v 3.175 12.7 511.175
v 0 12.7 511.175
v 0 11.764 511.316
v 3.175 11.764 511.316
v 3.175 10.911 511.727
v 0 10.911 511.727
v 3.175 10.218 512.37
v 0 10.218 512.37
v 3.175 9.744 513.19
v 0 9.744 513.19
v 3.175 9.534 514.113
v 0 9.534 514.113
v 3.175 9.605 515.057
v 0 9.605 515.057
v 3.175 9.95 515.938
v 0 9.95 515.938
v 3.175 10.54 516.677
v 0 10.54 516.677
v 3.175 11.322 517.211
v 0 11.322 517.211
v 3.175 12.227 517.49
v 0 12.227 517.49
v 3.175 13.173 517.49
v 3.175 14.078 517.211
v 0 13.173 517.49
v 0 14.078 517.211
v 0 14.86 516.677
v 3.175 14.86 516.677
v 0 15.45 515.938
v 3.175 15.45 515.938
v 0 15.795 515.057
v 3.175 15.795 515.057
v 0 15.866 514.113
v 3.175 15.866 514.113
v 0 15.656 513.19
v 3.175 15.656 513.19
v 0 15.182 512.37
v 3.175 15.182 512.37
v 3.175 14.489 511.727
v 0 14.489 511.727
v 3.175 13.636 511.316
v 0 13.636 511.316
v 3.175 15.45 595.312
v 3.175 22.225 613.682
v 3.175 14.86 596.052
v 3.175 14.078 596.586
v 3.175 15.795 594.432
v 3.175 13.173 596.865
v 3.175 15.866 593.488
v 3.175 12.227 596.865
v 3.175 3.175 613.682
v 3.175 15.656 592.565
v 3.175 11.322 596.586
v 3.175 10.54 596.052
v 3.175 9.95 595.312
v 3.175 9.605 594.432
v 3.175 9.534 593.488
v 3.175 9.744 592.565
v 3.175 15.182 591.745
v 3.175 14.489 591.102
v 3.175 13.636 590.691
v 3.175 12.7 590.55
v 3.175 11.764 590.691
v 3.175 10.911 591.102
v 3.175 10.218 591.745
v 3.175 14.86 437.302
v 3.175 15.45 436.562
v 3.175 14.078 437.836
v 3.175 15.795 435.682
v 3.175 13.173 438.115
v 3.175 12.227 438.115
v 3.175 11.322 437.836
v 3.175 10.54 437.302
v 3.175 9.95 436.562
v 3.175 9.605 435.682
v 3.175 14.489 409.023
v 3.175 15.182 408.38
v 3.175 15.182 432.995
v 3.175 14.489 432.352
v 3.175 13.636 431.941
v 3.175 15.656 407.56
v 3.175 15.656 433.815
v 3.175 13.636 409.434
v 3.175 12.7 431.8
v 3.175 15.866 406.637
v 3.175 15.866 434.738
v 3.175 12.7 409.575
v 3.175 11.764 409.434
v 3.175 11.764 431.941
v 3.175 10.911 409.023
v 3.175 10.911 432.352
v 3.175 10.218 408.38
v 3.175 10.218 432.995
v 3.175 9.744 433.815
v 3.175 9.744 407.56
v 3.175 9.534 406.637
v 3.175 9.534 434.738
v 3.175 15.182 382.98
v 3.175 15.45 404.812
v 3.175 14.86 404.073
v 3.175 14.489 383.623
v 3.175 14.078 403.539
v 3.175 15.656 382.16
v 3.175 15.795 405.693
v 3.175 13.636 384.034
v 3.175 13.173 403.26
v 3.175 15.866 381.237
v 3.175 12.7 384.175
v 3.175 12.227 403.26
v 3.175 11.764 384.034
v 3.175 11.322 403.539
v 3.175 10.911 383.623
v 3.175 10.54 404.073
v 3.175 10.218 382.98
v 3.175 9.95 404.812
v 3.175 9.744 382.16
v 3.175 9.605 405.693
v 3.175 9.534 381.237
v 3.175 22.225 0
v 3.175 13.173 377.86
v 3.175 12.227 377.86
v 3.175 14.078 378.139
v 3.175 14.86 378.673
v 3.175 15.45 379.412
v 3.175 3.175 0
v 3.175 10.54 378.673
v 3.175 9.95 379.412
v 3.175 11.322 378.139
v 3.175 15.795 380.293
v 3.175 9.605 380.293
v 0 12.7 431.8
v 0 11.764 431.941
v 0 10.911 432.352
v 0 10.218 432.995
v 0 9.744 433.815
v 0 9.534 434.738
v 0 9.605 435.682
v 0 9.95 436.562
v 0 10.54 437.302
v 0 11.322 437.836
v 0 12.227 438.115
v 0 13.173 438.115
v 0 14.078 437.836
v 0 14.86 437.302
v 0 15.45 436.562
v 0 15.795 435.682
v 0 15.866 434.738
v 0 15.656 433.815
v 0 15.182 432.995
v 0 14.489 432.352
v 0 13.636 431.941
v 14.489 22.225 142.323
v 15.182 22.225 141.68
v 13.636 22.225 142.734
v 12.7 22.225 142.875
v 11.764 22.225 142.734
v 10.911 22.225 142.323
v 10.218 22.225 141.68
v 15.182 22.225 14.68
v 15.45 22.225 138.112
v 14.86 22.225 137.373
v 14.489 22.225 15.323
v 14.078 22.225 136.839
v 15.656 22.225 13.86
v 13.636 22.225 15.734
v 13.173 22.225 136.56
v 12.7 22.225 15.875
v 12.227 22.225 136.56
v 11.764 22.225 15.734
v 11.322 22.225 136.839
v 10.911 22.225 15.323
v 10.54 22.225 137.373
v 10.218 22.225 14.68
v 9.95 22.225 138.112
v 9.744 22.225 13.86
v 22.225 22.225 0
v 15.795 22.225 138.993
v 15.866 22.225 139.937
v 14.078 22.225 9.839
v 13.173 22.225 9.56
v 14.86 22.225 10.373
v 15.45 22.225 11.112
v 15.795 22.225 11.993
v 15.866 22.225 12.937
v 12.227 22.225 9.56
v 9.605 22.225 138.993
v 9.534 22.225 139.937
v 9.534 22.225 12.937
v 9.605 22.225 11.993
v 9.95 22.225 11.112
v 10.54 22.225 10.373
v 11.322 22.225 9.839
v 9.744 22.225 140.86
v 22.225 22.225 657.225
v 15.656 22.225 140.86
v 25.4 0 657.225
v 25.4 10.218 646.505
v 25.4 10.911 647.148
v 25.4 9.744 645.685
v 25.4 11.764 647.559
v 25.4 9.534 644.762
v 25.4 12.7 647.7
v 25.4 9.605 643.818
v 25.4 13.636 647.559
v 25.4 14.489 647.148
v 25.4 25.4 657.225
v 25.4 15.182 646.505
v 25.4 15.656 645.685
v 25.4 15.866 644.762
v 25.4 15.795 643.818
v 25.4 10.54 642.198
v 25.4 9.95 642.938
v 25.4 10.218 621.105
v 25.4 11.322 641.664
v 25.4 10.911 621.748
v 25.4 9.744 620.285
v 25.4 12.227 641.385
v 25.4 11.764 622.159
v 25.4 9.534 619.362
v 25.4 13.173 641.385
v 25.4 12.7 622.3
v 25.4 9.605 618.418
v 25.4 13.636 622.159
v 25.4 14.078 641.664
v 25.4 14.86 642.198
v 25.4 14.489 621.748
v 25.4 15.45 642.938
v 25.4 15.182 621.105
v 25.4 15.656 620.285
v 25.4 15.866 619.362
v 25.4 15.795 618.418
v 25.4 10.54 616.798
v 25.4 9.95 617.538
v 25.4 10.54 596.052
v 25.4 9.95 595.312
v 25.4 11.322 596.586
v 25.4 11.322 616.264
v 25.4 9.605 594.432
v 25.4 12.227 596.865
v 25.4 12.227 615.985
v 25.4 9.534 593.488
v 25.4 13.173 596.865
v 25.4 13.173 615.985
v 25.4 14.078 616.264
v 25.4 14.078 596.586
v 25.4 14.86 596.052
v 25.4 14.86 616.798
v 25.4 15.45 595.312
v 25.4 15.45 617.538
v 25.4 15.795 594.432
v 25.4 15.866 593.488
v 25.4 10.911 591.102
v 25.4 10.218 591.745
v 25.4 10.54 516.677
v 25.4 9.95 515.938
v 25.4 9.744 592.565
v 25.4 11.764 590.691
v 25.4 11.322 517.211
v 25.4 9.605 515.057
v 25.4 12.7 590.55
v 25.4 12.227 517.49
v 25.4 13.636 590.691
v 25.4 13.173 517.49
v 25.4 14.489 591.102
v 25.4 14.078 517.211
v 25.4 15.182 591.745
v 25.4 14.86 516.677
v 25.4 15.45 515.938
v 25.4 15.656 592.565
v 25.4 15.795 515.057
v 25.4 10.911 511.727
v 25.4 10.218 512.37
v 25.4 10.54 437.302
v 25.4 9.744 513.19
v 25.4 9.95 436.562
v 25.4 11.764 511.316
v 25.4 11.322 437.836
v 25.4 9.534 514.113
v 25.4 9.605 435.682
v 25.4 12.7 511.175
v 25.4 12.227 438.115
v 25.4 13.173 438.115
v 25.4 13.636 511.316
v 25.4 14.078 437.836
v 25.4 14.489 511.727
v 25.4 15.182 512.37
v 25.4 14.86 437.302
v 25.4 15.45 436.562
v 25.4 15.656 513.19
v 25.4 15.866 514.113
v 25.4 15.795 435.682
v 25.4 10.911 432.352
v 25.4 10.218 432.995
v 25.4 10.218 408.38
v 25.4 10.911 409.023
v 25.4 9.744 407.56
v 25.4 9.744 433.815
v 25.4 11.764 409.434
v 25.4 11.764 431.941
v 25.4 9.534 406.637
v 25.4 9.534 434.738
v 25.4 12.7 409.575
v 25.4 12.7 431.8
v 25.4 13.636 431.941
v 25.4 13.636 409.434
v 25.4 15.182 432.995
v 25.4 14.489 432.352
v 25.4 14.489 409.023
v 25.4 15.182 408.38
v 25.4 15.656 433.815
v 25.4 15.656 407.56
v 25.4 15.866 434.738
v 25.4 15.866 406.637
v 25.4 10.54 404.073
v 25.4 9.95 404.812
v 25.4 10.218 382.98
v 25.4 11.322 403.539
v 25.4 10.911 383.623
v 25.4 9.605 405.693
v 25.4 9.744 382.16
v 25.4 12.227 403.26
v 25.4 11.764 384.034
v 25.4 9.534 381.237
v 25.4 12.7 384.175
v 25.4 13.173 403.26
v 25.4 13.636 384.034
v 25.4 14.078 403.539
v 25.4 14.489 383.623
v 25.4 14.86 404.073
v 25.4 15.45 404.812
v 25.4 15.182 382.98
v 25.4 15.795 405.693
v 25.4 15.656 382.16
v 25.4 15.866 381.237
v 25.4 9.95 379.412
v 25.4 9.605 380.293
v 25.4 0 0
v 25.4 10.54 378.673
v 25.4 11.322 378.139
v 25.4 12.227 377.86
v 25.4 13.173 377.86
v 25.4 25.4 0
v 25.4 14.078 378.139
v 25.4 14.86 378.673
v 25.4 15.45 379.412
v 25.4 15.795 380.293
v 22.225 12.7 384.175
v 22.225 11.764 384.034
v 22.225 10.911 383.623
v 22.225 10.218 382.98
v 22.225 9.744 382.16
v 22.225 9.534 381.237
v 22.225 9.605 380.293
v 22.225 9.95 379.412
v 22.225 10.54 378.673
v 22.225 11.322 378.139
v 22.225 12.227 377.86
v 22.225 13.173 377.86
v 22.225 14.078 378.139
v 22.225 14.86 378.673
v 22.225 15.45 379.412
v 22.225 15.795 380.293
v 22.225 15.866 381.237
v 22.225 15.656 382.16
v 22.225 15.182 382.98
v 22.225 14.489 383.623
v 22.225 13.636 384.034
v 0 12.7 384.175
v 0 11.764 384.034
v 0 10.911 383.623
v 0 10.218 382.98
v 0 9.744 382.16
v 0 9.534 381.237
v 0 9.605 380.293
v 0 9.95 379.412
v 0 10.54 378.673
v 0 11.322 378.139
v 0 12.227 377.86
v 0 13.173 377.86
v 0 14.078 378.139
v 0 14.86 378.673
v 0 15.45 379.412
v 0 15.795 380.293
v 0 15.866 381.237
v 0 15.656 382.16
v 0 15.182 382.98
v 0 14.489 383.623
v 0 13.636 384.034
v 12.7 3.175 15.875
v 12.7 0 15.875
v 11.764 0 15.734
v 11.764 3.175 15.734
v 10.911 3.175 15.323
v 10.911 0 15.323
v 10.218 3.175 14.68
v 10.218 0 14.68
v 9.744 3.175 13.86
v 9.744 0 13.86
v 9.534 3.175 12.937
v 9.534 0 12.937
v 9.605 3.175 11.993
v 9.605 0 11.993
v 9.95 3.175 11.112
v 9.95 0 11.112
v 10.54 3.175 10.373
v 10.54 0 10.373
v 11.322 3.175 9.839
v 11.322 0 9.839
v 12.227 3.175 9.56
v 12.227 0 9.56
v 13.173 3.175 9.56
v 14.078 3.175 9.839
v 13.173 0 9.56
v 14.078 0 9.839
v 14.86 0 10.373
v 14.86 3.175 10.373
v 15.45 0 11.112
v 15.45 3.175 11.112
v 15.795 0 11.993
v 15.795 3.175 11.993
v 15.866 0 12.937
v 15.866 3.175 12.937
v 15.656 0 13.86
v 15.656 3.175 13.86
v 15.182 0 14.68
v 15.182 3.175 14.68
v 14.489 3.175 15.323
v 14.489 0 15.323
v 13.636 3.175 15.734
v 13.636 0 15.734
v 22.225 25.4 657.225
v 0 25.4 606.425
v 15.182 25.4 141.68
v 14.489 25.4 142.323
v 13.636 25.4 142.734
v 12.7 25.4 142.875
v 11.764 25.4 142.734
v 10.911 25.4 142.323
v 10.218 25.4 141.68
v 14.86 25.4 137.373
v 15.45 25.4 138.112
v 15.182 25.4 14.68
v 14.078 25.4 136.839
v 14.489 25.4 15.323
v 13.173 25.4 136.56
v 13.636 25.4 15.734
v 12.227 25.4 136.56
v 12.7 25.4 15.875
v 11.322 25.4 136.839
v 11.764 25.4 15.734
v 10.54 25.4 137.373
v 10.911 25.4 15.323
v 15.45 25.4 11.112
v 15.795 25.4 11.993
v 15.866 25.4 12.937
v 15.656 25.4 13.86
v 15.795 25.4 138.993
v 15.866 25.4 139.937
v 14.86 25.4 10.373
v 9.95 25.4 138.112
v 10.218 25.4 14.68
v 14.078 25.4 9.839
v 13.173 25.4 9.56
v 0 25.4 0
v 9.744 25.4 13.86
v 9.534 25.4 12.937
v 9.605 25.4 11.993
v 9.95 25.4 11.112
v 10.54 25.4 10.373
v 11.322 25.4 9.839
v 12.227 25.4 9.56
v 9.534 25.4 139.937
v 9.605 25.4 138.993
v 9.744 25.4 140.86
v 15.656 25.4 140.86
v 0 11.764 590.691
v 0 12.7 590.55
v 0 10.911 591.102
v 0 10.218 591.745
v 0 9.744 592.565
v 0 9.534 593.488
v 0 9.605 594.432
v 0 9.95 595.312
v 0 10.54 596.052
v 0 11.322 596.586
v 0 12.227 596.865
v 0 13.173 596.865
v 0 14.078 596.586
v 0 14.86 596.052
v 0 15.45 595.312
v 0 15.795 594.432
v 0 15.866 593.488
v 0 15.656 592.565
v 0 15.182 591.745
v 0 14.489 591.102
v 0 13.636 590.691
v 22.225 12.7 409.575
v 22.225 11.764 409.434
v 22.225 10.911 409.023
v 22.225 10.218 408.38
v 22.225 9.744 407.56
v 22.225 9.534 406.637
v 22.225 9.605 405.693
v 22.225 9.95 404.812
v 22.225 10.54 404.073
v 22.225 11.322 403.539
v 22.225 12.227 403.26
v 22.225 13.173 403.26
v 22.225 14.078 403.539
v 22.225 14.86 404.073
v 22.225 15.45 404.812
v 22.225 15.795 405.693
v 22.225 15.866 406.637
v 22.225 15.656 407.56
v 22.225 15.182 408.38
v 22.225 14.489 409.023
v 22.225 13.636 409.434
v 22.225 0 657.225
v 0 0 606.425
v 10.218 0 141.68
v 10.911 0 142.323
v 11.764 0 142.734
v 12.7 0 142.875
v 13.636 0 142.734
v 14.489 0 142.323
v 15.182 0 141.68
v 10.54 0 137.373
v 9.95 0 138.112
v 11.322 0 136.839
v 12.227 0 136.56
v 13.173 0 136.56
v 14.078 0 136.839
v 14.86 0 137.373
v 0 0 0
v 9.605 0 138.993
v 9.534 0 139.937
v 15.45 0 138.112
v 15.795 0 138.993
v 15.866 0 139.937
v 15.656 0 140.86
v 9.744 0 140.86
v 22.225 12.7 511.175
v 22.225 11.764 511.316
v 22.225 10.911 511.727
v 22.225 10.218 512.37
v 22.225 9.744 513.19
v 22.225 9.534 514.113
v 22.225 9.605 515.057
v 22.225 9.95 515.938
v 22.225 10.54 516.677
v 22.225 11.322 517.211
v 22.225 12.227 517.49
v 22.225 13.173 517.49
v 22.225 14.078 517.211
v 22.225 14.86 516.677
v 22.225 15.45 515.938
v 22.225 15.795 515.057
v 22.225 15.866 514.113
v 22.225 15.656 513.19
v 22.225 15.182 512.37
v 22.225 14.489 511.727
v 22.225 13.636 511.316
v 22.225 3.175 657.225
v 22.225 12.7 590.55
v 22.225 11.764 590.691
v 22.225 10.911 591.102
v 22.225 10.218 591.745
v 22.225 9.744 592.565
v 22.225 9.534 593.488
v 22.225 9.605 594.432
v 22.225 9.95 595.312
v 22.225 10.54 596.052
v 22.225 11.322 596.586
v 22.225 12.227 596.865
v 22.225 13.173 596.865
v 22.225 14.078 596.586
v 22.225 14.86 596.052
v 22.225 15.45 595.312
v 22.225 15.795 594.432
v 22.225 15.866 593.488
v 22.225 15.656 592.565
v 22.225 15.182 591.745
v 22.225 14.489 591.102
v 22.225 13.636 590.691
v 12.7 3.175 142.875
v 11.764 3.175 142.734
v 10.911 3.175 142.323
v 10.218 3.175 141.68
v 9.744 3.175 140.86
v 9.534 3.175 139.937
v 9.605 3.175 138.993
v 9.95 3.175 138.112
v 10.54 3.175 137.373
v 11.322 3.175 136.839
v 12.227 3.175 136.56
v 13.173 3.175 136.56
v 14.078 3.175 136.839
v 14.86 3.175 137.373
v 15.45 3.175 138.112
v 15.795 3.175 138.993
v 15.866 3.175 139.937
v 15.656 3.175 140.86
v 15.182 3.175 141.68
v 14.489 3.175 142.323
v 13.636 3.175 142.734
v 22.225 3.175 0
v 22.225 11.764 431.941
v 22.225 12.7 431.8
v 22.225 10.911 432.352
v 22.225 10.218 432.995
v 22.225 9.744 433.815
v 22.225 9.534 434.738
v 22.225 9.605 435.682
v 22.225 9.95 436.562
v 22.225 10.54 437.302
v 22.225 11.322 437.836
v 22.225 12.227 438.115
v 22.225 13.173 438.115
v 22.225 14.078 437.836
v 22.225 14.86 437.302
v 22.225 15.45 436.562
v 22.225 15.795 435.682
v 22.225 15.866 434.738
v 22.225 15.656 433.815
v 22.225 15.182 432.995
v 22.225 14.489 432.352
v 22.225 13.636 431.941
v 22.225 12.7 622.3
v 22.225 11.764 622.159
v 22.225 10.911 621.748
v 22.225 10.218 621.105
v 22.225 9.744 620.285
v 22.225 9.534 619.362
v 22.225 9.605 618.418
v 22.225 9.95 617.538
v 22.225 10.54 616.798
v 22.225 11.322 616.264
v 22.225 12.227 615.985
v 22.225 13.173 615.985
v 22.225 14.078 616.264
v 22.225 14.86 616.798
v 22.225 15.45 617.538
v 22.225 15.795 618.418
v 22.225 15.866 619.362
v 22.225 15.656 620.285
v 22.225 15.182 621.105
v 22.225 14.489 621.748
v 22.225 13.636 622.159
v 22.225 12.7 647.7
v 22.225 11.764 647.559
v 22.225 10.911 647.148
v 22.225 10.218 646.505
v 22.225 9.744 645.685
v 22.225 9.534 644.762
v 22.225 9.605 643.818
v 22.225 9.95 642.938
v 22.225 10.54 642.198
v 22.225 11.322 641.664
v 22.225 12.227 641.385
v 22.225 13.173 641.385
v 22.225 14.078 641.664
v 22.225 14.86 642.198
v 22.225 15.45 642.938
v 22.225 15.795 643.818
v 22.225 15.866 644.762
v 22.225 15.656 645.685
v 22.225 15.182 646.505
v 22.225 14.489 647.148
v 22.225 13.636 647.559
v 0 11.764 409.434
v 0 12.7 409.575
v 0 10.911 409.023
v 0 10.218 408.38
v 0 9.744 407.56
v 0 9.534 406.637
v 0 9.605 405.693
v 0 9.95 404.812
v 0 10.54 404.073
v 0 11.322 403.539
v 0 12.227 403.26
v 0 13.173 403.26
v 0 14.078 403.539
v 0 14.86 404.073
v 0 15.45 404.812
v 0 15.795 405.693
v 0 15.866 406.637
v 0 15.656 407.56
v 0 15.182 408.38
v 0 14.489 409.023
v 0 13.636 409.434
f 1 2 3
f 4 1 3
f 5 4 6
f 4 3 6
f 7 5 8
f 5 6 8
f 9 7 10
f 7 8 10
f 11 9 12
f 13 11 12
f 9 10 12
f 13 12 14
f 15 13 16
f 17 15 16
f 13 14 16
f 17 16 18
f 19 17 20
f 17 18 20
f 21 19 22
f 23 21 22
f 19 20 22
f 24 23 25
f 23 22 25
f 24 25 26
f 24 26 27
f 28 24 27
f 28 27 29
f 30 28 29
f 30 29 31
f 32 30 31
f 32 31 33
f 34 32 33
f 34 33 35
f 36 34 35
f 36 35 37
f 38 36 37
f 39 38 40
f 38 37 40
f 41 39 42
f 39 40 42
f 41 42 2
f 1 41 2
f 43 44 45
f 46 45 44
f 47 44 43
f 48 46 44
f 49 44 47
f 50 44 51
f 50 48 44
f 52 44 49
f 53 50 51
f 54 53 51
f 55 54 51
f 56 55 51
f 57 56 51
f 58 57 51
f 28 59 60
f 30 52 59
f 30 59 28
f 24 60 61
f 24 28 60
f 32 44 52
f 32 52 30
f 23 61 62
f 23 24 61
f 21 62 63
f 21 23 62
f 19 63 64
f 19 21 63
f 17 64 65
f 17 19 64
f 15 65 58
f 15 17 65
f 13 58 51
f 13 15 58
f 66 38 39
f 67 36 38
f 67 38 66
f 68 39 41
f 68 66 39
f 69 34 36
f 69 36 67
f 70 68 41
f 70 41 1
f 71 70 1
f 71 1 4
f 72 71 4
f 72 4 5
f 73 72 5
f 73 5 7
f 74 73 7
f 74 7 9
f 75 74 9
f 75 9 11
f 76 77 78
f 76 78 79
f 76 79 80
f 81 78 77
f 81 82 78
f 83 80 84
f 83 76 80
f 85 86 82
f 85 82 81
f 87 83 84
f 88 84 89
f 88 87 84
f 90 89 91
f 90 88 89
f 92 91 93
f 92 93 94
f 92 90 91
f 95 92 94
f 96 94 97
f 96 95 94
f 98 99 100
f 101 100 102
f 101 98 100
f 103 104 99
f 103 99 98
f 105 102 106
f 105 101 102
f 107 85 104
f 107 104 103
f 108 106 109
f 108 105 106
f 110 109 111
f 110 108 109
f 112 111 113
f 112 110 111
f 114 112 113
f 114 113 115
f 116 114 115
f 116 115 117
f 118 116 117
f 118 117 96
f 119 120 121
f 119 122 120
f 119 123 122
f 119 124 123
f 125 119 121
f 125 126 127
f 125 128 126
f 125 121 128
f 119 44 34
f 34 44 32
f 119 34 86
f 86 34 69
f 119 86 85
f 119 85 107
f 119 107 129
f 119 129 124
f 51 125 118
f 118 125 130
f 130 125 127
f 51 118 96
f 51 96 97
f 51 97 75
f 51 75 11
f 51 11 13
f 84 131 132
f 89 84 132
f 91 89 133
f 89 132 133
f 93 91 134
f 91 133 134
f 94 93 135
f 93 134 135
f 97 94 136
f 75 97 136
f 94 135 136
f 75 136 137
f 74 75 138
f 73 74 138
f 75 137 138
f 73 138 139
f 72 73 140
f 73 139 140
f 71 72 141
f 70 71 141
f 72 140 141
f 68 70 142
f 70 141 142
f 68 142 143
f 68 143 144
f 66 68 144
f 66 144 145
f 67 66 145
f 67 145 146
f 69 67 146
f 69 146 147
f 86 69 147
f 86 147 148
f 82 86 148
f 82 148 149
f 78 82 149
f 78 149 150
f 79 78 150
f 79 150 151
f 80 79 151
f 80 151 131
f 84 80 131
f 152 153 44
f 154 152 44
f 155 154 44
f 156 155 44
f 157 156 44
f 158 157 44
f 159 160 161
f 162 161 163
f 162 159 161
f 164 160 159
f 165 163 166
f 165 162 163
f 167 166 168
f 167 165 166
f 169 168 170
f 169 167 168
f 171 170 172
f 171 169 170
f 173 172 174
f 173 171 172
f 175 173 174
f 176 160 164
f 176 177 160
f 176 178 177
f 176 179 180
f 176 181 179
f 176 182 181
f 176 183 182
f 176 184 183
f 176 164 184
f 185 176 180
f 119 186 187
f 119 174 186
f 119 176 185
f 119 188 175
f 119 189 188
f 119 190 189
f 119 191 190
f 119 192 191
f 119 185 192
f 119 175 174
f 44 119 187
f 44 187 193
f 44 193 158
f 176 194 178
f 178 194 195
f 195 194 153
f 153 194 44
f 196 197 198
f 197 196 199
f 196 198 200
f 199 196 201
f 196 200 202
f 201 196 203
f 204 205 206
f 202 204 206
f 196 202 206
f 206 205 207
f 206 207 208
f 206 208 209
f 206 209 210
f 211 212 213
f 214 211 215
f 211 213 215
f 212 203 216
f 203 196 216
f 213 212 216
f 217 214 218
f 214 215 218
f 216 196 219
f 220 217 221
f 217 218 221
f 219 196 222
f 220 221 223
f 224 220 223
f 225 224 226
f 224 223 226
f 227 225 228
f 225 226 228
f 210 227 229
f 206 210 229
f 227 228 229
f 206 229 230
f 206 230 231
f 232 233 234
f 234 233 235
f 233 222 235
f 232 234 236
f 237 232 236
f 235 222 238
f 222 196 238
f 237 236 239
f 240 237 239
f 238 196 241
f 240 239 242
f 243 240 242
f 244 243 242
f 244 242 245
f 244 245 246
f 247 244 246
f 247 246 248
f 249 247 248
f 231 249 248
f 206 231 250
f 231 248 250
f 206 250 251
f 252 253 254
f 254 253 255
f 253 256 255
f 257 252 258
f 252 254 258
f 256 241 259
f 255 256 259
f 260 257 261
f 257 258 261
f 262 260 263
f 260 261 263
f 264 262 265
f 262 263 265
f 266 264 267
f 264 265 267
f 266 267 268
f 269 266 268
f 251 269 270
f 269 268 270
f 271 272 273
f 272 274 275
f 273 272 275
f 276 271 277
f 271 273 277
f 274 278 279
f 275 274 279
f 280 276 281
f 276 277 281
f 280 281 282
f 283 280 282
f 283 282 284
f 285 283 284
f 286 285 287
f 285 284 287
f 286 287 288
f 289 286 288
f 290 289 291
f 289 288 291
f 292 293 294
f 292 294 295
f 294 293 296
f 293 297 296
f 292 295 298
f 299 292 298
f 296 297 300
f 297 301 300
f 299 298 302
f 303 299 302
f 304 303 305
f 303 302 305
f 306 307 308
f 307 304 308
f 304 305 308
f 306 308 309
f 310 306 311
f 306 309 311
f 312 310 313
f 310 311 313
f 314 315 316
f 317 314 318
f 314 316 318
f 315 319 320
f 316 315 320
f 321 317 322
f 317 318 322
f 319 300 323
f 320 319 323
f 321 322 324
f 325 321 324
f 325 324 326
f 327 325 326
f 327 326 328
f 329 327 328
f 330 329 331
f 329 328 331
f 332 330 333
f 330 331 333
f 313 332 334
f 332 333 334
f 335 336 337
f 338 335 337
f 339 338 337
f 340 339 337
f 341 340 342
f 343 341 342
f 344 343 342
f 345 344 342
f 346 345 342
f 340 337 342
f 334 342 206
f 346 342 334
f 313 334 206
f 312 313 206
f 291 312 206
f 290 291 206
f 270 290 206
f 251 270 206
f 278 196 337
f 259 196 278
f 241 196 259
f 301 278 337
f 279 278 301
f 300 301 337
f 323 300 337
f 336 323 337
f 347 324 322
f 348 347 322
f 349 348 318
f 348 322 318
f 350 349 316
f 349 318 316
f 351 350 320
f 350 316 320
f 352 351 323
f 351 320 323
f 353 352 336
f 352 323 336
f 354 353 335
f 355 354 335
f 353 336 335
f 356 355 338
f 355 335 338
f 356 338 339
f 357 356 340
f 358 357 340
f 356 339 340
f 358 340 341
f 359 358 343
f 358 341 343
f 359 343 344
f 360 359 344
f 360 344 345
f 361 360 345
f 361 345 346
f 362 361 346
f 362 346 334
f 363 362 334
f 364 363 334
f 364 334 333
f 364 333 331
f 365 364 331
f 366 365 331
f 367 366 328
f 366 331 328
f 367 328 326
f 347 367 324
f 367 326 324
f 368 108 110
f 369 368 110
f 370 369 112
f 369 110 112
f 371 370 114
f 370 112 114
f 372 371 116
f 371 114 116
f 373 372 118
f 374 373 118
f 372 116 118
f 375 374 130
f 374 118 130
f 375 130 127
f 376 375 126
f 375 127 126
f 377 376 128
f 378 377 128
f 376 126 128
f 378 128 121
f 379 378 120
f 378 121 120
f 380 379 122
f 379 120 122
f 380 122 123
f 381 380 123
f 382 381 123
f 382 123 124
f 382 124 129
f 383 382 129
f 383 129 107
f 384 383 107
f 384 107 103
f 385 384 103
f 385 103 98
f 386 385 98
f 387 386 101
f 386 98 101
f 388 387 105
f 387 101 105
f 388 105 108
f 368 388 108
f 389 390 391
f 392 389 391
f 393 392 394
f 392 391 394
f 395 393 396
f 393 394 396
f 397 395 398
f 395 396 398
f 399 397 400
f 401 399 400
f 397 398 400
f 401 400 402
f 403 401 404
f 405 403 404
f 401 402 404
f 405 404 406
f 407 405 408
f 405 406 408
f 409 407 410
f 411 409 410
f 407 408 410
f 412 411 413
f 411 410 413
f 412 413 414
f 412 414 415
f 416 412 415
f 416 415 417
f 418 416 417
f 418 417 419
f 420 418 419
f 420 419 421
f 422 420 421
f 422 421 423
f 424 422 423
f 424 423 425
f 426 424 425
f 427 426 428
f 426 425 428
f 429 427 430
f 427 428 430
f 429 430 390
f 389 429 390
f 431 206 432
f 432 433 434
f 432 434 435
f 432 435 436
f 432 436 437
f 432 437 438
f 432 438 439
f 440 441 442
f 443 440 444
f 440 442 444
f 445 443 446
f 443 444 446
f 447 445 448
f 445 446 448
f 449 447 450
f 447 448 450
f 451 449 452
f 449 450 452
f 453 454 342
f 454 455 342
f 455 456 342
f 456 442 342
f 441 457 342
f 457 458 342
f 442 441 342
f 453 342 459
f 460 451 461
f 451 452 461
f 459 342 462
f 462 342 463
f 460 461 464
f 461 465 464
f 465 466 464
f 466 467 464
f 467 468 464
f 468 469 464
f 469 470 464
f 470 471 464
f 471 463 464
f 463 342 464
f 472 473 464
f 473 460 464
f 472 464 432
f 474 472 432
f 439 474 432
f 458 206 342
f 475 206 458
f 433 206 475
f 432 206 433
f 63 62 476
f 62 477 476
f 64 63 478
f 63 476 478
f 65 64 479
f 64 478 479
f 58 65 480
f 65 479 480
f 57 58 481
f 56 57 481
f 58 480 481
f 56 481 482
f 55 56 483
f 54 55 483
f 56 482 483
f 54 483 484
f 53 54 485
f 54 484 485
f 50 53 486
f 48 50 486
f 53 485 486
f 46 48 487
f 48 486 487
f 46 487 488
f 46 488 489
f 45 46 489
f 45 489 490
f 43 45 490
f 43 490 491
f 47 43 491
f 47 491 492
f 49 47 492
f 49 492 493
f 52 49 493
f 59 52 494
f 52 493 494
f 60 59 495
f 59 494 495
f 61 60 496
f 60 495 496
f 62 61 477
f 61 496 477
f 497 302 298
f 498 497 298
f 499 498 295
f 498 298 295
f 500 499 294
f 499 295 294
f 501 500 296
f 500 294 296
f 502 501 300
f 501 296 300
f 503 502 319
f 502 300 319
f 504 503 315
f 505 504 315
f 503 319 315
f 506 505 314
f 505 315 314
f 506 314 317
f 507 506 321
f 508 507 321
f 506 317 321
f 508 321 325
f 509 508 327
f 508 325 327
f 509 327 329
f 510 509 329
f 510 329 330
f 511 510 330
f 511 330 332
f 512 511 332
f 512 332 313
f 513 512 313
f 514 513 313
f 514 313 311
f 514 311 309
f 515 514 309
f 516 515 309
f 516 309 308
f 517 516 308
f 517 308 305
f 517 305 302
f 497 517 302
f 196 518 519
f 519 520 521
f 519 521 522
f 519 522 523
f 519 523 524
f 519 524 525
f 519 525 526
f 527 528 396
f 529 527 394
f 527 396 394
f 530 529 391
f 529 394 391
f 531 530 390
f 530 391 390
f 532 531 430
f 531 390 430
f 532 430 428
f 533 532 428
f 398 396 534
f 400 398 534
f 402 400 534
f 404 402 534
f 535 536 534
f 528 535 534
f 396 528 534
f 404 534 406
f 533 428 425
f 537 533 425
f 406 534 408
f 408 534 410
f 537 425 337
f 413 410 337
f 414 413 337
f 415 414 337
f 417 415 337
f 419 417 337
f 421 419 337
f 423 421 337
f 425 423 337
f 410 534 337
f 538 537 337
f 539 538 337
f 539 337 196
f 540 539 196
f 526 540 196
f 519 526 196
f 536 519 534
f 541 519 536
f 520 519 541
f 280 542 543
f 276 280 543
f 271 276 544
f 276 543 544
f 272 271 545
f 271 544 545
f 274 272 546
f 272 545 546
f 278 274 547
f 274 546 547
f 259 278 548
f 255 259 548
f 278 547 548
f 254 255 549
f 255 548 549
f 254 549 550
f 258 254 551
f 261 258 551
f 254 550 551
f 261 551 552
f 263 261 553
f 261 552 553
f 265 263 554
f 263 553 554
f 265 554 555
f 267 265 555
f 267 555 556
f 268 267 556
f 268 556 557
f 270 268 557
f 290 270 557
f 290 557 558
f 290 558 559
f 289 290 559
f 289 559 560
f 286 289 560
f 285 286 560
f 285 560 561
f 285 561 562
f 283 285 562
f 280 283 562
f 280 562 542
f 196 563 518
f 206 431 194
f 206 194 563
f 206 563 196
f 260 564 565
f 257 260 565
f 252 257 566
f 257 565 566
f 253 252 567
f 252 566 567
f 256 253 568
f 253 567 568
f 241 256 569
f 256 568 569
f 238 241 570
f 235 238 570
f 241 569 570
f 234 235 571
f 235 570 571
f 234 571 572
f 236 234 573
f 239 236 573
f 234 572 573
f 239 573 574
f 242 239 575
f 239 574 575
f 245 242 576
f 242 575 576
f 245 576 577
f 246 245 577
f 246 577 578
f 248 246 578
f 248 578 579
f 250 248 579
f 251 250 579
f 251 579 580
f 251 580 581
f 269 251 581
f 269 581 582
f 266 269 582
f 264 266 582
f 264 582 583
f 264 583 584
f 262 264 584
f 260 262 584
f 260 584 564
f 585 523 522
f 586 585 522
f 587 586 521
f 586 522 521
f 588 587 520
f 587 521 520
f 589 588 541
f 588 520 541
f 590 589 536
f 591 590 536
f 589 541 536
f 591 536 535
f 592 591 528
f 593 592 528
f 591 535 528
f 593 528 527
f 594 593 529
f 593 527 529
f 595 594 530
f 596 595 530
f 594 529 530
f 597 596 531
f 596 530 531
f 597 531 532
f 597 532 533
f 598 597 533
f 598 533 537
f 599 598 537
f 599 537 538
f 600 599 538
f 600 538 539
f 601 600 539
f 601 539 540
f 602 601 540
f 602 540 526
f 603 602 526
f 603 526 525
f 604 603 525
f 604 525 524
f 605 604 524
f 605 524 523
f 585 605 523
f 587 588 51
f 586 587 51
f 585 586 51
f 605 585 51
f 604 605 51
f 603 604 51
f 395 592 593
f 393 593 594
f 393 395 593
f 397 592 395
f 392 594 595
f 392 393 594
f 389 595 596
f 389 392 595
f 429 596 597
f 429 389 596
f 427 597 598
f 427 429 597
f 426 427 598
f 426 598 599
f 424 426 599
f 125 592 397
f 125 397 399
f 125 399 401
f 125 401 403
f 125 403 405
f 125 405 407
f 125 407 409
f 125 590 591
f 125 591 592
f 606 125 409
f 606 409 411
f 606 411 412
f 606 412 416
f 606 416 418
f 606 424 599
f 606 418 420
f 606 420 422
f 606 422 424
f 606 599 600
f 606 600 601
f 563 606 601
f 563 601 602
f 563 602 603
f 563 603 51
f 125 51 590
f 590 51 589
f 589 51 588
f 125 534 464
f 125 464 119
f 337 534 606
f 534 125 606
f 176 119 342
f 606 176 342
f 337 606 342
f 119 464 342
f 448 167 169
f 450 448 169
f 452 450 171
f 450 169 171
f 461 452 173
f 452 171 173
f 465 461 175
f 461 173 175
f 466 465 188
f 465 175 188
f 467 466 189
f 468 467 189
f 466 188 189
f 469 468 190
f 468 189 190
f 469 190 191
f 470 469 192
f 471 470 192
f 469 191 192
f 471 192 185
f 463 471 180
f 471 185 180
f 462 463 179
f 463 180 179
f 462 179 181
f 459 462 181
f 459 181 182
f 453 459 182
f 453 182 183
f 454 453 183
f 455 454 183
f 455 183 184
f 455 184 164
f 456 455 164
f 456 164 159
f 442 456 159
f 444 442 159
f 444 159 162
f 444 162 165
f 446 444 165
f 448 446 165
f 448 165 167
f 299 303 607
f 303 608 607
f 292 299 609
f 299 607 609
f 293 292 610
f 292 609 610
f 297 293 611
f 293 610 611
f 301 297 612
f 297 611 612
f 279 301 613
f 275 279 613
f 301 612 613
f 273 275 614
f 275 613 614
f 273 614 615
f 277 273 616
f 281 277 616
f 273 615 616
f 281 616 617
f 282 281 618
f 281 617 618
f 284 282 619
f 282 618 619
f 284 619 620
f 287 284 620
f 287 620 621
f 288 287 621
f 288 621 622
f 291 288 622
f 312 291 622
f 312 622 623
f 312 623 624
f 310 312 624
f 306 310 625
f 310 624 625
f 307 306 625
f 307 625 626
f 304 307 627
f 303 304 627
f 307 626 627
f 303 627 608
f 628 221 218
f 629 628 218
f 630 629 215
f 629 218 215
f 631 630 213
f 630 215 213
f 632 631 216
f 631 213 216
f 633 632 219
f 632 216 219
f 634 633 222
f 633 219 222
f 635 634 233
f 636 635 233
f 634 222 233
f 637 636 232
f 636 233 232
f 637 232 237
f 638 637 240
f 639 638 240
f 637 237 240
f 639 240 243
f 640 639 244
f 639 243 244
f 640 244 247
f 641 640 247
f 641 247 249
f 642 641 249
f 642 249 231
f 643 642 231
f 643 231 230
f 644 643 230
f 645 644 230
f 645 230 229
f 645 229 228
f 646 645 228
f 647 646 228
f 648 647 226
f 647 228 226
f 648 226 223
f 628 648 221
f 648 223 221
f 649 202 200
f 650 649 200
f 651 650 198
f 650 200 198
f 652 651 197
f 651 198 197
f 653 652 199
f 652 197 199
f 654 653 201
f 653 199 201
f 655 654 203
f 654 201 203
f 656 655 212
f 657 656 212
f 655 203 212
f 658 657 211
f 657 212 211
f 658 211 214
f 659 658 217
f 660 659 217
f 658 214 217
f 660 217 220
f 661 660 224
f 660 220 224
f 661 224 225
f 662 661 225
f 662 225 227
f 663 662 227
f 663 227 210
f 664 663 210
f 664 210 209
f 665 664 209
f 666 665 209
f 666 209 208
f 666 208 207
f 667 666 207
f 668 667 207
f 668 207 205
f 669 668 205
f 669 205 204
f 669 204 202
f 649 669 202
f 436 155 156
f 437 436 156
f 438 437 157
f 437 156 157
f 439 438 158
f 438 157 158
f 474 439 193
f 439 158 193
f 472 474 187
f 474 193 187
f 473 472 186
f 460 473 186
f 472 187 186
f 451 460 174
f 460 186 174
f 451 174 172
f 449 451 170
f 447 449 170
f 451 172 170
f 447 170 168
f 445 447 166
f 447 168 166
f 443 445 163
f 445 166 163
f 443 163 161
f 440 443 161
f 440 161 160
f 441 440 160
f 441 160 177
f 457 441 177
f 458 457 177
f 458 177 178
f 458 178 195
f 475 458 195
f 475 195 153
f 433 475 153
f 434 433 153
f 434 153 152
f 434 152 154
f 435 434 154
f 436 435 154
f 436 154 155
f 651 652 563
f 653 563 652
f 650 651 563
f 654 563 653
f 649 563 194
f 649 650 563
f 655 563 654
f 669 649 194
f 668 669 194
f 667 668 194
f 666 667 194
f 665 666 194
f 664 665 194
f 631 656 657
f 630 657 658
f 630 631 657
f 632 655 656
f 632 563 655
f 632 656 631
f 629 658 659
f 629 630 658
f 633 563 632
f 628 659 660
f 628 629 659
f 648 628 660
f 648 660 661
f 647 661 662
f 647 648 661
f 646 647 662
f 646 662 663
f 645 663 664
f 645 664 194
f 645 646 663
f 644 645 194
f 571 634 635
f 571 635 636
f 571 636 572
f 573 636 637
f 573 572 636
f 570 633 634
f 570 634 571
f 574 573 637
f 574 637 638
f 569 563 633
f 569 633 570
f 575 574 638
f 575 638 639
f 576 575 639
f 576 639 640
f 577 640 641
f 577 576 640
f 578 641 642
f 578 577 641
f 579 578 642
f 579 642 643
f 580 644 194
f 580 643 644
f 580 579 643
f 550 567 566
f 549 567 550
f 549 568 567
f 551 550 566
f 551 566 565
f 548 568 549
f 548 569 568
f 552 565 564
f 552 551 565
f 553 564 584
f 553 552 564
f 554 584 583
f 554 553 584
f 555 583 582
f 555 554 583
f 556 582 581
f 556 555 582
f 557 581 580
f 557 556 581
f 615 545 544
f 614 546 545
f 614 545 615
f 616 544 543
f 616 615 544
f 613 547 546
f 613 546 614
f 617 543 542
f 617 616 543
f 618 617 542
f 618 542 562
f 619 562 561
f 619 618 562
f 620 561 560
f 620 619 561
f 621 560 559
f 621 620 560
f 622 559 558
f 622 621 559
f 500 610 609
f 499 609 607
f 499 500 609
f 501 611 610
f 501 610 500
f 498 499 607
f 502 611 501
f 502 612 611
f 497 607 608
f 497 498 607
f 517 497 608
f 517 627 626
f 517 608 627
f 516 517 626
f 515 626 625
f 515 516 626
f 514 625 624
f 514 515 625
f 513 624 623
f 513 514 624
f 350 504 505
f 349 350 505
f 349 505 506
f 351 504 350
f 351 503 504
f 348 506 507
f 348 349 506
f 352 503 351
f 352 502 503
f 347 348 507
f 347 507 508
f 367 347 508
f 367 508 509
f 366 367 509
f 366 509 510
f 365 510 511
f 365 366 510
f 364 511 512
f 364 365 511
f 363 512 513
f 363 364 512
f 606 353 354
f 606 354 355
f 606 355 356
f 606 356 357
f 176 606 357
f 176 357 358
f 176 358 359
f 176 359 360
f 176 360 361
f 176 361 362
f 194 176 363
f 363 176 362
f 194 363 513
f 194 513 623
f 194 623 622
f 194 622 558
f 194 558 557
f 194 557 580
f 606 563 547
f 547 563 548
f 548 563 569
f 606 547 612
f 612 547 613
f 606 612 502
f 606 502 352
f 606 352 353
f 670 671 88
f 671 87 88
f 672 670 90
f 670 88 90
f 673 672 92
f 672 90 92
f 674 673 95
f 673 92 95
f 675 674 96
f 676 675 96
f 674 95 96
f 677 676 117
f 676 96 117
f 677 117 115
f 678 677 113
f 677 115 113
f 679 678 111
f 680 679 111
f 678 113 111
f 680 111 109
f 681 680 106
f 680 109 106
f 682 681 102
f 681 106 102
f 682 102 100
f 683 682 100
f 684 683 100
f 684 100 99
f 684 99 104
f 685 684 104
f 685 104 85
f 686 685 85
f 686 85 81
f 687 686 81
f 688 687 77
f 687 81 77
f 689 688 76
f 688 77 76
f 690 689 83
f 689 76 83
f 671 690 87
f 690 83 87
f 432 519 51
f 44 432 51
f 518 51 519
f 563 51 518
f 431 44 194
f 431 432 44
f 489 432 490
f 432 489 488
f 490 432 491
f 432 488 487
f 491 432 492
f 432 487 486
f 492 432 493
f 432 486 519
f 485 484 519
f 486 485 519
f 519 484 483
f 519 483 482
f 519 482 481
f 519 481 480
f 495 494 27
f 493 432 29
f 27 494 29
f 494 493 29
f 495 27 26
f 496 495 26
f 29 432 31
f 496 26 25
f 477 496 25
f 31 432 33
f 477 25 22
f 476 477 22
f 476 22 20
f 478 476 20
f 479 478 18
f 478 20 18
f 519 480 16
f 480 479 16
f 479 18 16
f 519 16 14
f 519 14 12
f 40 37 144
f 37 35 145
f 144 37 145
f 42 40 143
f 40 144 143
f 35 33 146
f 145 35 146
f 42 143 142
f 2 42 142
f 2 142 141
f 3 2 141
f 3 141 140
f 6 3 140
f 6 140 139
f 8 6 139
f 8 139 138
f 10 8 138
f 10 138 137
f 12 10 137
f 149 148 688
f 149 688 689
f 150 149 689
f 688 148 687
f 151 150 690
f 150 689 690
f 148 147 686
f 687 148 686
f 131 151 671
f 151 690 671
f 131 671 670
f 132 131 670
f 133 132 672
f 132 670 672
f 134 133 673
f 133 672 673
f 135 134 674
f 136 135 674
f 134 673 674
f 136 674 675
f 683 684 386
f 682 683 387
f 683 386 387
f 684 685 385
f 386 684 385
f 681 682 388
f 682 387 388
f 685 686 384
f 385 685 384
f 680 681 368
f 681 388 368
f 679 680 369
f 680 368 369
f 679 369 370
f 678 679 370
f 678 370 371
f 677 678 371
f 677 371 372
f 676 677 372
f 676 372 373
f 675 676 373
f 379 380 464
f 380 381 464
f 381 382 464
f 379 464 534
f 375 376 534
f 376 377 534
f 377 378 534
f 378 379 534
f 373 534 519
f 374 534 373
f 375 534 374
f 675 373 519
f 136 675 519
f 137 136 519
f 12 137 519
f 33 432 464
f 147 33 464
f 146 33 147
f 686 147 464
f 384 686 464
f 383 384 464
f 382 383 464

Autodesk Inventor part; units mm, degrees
ref_plane "YZ Plane" through (0, 0, 0) normal (1, 0, 0) x (0, 1, 0)
ref_plane "XZ Plane" through (0, 0, 0) normal (0, 1, 0) x (-1, 0, 0)
ref_plane "XY Plane" through (0, 0, 0) normal (0, 0, 1) x (1, 0, 0)
sketch "Sketch1" plane through (0, 0, 0) normal (0, 0, 1) x (1, 0, 0)
  line L0 (0, 0) -> (25.4, 0)
  line L1 (25.4, 0) -> (25.4, 25.4)
  line L2 (25.4, 25.4) -> (0, 25.4)
  line L3 (0, 25.4) -> (0, 0)
  line L4 (3.175, 3.175) -> (22.225, 3.175)
  line L5 (22.225, 3.175) -> (22.225, 22.225)
  line L6 (22.225, 22.225) -> (3.175, 22.225)
  line L7 (3.175, 22.225) -> (3.175, 3.175)
  dimension "d0" = 25.4
  dimension "d1" = 25.4
  dimension "d2" = 19.05
  dimension "d3" = 19.05
  dimension "d4" = 3.175
  dimension "d5" = 3.175
extrude "Extrusion1" add sketch "Sketch1" along normal blind 657.225
sketch "Sketch2" plane through (0, 25.4, 0) normal (0, 1, 0) x (1, 0, 0)
  line L0 (25.4, 0) -> (0, 0) projected
  line L1 (0, 0) -> (0, -657.225) projected
  point P0 (12.7, -12.7)
  point P1 (12.7, -139.7)
  dimension "d8" = 12.7
  dimension "d9" = 12.7
  dimension "d10" = 12.7
  dimension "d11" = 139.7
hole "Hole1" at (12.7, 25.4, 12.7) at (12.7, 25.4, 139.7) direction (0, -1, 0) diameter 6.35 end through all
sketch "Sketch3" plane through (0, 0, 0) normal (-1, 0, 0) x (0, 0, 1)
  line L0 (0, 0) -> (657.225, 0) projected
  line L1 (657.225, 25.4) -> (657.225, 0) projected
  point P0 (644.525, 12.7)
  point P1 (619.125, 12.7)
  point P2 (406.4, 12.7)
  point P3 (381, 12.7)
  dimension "d19" = 12.7
  dimension "d20" = 12.7
  dimension "d21" = 12.7
  dimension "d22" = 25.4
  dimension "d23" = 212.725
  dimension "d24" = 12.7
  dimension "d25" = 12.7
  dimension "d26" = 25.4
hole "Hole2" at (0, 12.7, 644.525) at (0, 12.7, 619.125) at (0, 12.7, 406.4) at (0, 12.7, 381) direction (1, 0, 0) diameter 6.35 end through all
sketch "Sketch5" plane through (0, 25.4, 0) normal (0, 1, 0) x (1, 0, 0)
  circle A0 centre (12.7, -12.7) radius 3.175 projected
  circle A1 centre (12.7, -139.7) radius 3.175 projected
  line L0 (25.4, 0) -> (0, 0) projected
  line L1 (0, 0) -> (0, -657.225) projected
  line L2 (25.4, -657.225) -> (0, -657.225) projected
  line L3 (25.4, 0) -> (25.4, -657.225) projected
  line L4 (0, -657.225) -> (22.225, -657.225)
  line L5 (22.225, -657.225) -> (3.175, -657.225) projected
  line L6 (0, -657.225) -> (0, -606.425)
  line L7 (0, 0) -> (0, -657.225) projected
  line L8 (0, -606.425) -> (22.225, -657.225)
  dimension "d37" = 22.225
  dimension "d38" = 50.8
extrude "Extrusion3" cut sketch "Sketch5" against normal blind 25.4 contours L8 L2 L1
sketch "Sketch6" plane through (25.4, 0, 0) normal (1, 0, 0) x (0, 0, -1)
  line L0 (0, 25.4) -> (-657.225, 25.4) projected
  line L1 (-657.225, 0) -> (-657.225, 25.4) projected
  point P0 (-593.725, 12.7)
  point P1 (-514.35, 12.7)
  point P2 (-434.975, 12.7)
  dimension "d41" = 12.7
  dimension "d42" = 63.5
  dimension "d43" = 142.875
  dimension "d44" = 12.7
  dimension "d45" = 12.7
  dimension "d46" = 222.25
hole "Hole3" at (25.4, 12.7, 593.725) at (25.4, 12.7, 514.35) at (25.4, 12.7, 434.975) direction (-1, 0, 0) diameter 6.35 end through all
properties part number "pickup arm 1x1 long" material "Aluminum 6061"
